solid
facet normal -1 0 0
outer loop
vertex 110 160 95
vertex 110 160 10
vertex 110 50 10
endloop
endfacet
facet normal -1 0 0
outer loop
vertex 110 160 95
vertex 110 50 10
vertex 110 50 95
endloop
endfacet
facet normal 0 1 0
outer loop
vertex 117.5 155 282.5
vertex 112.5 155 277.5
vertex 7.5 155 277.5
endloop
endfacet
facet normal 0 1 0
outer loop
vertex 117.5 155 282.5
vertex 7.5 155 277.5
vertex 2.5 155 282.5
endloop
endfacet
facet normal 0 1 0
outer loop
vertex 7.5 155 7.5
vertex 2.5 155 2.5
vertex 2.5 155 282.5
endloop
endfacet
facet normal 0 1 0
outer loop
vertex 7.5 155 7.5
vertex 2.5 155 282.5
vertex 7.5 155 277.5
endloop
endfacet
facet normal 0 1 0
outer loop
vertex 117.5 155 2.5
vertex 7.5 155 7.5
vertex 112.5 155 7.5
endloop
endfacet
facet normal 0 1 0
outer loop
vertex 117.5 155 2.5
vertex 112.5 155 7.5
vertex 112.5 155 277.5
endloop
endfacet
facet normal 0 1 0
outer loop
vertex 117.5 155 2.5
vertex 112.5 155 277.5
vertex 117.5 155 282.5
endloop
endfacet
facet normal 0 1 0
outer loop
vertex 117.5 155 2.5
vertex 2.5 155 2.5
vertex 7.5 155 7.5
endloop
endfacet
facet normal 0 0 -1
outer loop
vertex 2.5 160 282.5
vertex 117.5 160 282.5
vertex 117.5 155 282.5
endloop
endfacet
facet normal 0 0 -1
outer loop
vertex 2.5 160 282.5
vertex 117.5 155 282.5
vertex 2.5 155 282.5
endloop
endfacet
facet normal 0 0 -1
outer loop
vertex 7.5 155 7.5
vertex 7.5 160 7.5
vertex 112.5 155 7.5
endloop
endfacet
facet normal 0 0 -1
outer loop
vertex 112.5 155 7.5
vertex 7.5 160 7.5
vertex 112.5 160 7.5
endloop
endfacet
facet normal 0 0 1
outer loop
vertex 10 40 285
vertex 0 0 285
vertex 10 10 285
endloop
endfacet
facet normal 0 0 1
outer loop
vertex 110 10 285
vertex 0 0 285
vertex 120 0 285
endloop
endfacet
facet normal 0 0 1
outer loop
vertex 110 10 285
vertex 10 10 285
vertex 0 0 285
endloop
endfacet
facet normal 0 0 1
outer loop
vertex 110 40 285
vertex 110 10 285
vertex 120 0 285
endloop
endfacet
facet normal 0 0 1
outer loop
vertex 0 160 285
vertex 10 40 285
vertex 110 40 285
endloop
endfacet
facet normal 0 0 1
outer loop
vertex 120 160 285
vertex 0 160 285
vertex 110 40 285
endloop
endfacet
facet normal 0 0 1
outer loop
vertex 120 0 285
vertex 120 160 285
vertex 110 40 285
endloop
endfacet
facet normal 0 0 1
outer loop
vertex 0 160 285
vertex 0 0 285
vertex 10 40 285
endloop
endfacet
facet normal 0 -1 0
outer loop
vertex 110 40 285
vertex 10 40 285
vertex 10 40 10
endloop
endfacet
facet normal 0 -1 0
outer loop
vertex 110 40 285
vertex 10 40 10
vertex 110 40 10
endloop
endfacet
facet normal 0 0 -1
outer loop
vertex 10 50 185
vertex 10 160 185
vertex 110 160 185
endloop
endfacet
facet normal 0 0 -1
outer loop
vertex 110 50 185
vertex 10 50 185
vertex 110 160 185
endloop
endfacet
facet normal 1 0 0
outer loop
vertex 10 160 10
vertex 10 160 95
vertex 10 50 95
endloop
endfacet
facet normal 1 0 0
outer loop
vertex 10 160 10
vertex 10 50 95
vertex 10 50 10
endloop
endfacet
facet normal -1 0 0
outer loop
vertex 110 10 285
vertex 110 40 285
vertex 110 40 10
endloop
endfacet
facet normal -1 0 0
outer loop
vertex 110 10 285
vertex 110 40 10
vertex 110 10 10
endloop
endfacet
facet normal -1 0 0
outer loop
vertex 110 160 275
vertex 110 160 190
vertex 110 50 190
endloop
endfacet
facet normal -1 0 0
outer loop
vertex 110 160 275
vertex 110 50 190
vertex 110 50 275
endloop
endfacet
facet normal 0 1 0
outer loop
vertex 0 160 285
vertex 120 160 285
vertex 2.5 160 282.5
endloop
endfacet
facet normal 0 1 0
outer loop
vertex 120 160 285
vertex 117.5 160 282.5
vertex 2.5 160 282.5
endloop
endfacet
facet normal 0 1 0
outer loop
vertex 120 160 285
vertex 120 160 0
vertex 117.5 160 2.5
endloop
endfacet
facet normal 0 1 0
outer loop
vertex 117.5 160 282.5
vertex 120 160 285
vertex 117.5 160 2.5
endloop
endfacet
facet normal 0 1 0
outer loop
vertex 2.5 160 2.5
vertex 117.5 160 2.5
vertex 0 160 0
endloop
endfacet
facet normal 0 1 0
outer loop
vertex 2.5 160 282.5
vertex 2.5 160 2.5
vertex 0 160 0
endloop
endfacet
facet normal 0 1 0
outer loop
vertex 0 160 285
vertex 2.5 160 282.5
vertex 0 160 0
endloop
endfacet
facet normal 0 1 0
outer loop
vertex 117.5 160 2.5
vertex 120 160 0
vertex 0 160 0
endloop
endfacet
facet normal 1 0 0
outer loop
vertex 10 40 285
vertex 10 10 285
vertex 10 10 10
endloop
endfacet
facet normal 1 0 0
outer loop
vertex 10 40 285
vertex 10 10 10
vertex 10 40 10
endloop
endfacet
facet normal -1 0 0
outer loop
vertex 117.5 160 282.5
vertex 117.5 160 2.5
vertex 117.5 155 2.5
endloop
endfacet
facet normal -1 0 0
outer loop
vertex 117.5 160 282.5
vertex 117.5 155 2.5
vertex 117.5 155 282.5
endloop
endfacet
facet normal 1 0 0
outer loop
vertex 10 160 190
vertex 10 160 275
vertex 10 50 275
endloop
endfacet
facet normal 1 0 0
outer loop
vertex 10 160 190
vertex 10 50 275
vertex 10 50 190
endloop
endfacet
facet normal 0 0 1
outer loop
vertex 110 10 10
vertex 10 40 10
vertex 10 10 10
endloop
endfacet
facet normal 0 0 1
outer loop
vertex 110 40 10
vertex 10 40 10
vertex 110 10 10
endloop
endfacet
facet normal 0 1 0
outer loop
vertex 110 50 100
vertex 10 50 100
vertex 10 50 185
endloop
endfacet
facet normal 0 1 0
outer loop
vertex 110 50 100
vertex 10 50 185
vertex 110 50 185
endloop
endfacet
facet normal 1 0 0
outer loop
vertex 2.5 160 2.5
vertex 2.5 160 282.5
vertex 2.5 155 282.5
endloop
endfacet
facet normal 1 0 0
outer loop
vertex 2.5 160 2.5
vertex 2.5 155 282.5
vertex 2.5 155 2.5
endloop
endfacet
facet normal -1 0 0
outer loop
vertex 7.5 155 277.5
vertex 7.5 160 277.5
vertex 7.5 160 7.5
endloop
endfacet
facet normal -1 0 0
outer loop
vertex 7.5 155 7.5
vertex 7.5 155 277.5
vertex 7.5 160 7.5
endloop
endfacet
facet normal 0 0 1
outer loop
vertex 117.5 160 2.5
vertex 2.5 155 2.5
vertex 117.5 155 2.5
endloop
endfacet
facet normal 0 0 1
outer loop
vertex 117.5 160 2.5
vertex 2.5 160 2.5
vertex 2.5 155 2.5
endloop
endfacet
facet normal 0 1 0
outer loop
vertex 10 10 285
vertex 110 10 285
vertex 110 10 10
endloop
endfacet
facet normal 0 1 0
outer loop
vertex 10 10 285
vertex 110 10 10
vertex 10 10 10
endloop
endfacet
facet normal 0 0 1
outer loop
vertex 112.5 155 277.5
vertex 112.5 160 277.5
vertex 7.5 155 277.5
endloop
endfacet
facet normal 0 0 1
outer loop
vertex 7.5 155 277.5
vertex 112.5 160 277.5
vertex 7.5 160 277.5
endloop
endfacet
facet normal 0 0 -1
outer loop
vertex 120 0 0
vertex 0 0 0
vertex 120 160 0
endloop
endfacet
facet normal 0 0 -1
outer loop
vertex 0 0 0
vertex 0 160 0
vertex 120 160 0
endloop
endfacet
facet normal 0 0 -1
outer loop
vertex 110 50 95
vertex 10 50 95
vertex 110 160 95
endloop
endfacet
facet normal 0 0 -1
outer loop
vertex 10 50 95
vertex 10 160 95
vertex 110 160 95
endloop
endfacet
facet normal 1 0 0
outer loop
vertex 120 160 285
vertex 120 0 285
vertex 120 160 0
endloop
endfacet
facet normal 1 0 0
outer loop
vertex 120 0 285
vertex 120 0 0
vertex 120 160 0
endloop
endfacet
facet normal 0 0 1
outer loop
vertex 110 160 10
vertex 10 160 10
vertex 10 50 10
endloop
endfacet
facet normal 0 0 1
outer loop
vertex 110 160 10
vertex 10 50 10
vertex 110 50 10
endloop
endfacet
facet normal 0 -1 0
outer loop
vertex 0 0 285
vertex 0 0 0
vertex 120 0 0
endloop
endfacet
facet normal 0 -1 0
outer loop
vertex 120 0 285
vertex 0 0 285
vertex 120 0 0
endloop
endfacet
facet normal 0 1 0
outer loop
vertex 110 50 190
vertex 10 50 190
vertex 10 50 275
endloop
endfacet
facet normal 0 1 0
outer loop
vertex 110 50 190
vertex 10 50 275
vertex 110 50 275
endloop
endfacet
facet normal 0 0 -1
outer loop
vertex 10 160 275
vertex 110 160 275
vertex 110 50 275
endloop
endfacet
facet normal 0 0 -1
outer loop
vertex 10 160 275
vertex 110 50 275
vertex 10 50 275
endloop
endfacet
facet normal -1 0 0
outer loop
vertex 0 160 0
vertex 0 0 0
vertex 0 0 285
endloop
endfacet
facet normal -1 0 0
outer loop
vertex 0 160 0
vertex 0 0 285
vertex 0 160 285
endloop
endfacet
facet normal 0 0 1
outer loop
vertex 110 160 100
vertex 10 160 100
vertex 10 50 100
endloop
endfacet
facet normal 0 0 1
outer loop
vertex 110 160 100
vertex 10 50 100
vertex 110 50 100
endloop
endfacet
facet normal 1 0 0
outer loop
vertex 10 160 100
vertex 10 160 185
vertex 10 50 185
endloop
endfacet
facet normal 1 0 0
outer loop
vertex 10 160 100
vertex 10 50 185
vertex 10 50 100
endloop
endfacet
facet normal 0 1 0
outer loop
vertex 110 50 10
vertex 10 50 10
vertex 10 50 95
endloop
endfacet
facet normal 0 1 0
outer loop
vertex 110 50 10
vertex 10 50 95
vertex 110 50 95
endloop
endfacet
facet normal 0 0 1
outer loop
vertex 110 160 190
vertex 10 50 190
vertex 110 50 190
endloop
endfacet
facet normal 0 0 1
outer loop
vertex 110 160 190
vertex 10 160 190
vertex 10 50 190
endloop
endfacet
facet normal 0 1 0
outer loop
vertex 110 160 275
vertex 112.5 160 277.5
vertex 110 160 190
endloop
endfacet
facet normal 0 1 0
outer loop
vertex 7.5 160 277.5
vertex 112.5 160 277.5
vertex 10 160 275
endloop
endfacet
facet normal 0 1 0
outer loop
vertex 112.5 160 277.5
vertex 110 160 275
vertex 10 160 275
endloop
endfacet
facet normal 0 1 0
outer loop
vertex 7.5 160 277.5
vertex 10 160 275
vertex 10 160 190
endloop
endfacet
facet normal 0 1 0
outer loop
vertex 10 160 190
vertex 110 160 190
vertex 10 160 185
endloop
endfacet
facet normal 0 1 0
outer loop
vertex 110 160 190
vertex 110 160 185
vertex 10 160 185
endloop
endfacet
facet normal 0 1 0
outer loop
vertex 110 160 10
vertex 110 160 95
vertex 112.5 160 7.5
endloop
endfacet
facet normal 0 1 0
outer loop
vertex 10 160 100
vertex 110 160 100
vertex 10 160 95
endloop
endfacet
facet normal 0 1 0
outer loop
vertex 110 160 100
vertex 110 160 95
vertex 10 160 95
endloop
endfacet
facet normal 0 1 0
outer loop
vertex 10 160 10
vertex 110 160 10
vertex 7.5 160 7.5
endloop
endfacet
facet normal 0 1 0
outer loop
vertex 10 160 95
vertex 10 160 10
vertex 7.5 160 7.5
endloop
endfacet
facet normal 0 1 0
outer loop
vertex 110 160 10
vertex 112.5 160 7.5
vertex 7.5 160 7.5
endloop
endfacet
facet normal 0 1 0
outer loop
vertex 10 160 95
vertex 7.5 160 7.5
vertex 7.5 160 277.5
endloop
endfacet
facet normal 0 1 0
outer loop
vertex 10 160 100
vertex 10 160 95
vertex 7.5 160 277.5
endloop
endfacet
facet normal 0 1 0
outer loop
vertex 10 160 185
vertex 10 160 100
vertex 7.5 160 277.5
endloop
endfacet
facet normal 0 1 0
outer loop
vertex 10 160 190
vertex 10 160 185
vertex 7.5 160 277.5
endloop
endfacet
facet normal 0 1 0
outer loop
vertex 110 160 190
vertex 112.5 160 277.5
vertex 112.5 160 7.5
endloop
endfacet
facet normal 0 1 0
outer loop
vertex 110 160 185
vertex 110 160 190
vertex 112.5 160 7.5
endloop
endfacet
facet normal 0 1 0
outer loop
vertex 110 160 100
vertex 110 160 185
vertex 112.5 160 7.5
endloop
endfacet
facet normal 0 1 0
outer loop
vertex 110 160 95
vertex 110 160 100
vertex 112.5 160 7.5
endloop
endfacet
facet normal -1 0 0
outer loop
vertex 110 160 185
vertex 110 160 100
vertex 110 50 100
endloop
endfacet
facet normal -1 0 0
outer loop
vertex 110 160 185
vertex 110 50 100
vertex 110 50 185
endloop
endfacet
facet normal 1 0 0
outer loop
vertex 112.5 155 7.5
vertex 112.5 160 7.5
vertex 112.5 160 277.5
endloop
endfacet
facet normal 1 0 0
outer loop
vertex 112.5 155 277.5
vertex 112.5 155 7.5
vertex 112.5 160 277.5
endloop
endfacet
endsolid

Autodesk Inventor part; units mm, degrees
ref_plane "YZ Plane" through (0, 0, 0) normal (1, 0, 0) x (0, 1, 0)
ref_plane "XZ Plane" through (0, 0, 0) normal (0, 1, 0) x (-1, 0, 0)
ref_plane "XY Plane" through (0, 0, 0) normal (0, 0, 1) x (1, 0, 0)
sketch "Skizze1" plane through (0, 0, 0) normal (0, 0, 1) x (1, 0, 0)
  line L0 (-24, 0) -> (144, 0) projected
  line L1 (0, -32) -> (0, 192) projected
  line L2 (0, 0) -> (120, 0)
  line L3 (120, 0) -> (120, 160)
  line L4 (120, 160) -> (0, 160)
  line L5 (0, 160) -> (0, 0)
  point P0 (0, 160)
  dimension "d0" = 120
  dimension "d1" = 160
extrude "Extrusion1" add sketch "Skizze1" along normal blind 285
sketch "Skizze2" plane through (0, 160, 0) normal (0, 1, 0) x (1, 0, 0)
  point P0 (0, 0)
sketch "Skizze3" plane through (0, 0, 285) normal (0, 0, 1) x (1, 0, 0)
  line L0 (10, 40) -> (110, 40)
  line L1 (110, 40) -> (110, 10)
  line L2 (110, 10) -> (10, 10)
  line L3 (10, 10) -> (10, 40)
  line L4 (0, 0) -> (120, 0) projected
  line L5 (120, 0) -> (120, 160) projected
  line L6 (0, 160) -> (0, 0) projected
  dimension "d4" = 10
  dimension "d5" = 10
  dimension "d6" = 10
  dimension "d7" = 30
extrude "Extrusion2" cut sketch "Skizze3" against normal blind 275
sketch "Skizze4" plane through (0, 160, 0) normal (0, 1, 0) x (1, 0, 0)
  point P0 (0, 0)
sketch "Skizze5" plane through (0, 160, 0) normal (0, 1, 0) x (1, 0, 0)
  line L0 (10, -10) -> (110, -10)
  line L1 (110, -10) -> (110, -275)
  line L2 (110, -275) -> (10, -275)
  line L3 (10, -275) -> (10, -10)
  line L4 (10, -190) -> (110, -190)
  line L5 (120, 0) -> (0, 0) projected
  line L6 (10, -100) -> (110, -100)
  line L7 (10, -185) -> (110, -185)
  line L8 (120, -285) -> (0, -285) projected
  line L9 (10, -95) -> (110, -95)
  line L10 (0, 0) -> (0, -285) projected
  line L11 (120, 0) -> (120, -285) projected
  dimension "d10" = 10
  dimension "d11" = 10
  dimension "d12" = 5
  dimension "d13" = 85
  dimension "d14" = 85
  dimension "d15" = 5
  dimension "d16" = 85
  dimension "d17" = 10
  dimension "d18" = 10
extrude "Extrusion3" cut sketch "Skizze5" against normal blind 110 contours L0 L1 L9 L3 | L6 L1 L7 L3 | L4 L1 L2 L3
sketch "Skizze6" plane through (0, 160, 0) normal (0, 1, 0) x (1, 0, 0)
  line L0 (7.5, -7.5) -> (112.5, -7.5)
  line L1 (112.5, -7.5) -> (112.5, -277.5)
  line L2 (112.5, -277.5) -> (7.5, -277.5)
  line L3 (7.5, -277.5) -> (7.5, -7.5)
  line L4 (2.5, -2.5) -> (117.5, -2.5)
  line L5 (117.5, -2.5) -> (117.5, -282.5)
  line L6 (117.5, -282.5) -> (2.5, -282.5)
  line L7 (2.5, -282.5) -> (2.5, -2.5)
  line L8 (120, 0) -> (120, -285) projected
  line L9 (110, -190) -> (110, -275) projected
  line L10 (110, -275) -> (10, -275) projected
  line L11 (120, -285) -> (0, -285) projected
  line L12 (10, -275) -> (10, -190) projected
  line L13 (0, 0) -> (0, -285) projected
  line L14 (120, 0) -> (0, 0) projected
  line L15 (10, -10) -> (110, -10) projected
  dimension "d21" = 2.5
  dimension "d22" = 2.5
  dimension "d23" = 2.5
  dimension "d24" = 2.5
  dimension "d25" = 2.5
  dimension "d26" = 2.5
  dimension "d27" = 2.5
  dimension "d28" = 2.5
extrude "Extrusion4" cut sketch "Skizze6" against normal blind 5 contours L4 L5 L6 L7
properties part number "EierkocherTeil1" material "Acetalharz, Schwarz"
